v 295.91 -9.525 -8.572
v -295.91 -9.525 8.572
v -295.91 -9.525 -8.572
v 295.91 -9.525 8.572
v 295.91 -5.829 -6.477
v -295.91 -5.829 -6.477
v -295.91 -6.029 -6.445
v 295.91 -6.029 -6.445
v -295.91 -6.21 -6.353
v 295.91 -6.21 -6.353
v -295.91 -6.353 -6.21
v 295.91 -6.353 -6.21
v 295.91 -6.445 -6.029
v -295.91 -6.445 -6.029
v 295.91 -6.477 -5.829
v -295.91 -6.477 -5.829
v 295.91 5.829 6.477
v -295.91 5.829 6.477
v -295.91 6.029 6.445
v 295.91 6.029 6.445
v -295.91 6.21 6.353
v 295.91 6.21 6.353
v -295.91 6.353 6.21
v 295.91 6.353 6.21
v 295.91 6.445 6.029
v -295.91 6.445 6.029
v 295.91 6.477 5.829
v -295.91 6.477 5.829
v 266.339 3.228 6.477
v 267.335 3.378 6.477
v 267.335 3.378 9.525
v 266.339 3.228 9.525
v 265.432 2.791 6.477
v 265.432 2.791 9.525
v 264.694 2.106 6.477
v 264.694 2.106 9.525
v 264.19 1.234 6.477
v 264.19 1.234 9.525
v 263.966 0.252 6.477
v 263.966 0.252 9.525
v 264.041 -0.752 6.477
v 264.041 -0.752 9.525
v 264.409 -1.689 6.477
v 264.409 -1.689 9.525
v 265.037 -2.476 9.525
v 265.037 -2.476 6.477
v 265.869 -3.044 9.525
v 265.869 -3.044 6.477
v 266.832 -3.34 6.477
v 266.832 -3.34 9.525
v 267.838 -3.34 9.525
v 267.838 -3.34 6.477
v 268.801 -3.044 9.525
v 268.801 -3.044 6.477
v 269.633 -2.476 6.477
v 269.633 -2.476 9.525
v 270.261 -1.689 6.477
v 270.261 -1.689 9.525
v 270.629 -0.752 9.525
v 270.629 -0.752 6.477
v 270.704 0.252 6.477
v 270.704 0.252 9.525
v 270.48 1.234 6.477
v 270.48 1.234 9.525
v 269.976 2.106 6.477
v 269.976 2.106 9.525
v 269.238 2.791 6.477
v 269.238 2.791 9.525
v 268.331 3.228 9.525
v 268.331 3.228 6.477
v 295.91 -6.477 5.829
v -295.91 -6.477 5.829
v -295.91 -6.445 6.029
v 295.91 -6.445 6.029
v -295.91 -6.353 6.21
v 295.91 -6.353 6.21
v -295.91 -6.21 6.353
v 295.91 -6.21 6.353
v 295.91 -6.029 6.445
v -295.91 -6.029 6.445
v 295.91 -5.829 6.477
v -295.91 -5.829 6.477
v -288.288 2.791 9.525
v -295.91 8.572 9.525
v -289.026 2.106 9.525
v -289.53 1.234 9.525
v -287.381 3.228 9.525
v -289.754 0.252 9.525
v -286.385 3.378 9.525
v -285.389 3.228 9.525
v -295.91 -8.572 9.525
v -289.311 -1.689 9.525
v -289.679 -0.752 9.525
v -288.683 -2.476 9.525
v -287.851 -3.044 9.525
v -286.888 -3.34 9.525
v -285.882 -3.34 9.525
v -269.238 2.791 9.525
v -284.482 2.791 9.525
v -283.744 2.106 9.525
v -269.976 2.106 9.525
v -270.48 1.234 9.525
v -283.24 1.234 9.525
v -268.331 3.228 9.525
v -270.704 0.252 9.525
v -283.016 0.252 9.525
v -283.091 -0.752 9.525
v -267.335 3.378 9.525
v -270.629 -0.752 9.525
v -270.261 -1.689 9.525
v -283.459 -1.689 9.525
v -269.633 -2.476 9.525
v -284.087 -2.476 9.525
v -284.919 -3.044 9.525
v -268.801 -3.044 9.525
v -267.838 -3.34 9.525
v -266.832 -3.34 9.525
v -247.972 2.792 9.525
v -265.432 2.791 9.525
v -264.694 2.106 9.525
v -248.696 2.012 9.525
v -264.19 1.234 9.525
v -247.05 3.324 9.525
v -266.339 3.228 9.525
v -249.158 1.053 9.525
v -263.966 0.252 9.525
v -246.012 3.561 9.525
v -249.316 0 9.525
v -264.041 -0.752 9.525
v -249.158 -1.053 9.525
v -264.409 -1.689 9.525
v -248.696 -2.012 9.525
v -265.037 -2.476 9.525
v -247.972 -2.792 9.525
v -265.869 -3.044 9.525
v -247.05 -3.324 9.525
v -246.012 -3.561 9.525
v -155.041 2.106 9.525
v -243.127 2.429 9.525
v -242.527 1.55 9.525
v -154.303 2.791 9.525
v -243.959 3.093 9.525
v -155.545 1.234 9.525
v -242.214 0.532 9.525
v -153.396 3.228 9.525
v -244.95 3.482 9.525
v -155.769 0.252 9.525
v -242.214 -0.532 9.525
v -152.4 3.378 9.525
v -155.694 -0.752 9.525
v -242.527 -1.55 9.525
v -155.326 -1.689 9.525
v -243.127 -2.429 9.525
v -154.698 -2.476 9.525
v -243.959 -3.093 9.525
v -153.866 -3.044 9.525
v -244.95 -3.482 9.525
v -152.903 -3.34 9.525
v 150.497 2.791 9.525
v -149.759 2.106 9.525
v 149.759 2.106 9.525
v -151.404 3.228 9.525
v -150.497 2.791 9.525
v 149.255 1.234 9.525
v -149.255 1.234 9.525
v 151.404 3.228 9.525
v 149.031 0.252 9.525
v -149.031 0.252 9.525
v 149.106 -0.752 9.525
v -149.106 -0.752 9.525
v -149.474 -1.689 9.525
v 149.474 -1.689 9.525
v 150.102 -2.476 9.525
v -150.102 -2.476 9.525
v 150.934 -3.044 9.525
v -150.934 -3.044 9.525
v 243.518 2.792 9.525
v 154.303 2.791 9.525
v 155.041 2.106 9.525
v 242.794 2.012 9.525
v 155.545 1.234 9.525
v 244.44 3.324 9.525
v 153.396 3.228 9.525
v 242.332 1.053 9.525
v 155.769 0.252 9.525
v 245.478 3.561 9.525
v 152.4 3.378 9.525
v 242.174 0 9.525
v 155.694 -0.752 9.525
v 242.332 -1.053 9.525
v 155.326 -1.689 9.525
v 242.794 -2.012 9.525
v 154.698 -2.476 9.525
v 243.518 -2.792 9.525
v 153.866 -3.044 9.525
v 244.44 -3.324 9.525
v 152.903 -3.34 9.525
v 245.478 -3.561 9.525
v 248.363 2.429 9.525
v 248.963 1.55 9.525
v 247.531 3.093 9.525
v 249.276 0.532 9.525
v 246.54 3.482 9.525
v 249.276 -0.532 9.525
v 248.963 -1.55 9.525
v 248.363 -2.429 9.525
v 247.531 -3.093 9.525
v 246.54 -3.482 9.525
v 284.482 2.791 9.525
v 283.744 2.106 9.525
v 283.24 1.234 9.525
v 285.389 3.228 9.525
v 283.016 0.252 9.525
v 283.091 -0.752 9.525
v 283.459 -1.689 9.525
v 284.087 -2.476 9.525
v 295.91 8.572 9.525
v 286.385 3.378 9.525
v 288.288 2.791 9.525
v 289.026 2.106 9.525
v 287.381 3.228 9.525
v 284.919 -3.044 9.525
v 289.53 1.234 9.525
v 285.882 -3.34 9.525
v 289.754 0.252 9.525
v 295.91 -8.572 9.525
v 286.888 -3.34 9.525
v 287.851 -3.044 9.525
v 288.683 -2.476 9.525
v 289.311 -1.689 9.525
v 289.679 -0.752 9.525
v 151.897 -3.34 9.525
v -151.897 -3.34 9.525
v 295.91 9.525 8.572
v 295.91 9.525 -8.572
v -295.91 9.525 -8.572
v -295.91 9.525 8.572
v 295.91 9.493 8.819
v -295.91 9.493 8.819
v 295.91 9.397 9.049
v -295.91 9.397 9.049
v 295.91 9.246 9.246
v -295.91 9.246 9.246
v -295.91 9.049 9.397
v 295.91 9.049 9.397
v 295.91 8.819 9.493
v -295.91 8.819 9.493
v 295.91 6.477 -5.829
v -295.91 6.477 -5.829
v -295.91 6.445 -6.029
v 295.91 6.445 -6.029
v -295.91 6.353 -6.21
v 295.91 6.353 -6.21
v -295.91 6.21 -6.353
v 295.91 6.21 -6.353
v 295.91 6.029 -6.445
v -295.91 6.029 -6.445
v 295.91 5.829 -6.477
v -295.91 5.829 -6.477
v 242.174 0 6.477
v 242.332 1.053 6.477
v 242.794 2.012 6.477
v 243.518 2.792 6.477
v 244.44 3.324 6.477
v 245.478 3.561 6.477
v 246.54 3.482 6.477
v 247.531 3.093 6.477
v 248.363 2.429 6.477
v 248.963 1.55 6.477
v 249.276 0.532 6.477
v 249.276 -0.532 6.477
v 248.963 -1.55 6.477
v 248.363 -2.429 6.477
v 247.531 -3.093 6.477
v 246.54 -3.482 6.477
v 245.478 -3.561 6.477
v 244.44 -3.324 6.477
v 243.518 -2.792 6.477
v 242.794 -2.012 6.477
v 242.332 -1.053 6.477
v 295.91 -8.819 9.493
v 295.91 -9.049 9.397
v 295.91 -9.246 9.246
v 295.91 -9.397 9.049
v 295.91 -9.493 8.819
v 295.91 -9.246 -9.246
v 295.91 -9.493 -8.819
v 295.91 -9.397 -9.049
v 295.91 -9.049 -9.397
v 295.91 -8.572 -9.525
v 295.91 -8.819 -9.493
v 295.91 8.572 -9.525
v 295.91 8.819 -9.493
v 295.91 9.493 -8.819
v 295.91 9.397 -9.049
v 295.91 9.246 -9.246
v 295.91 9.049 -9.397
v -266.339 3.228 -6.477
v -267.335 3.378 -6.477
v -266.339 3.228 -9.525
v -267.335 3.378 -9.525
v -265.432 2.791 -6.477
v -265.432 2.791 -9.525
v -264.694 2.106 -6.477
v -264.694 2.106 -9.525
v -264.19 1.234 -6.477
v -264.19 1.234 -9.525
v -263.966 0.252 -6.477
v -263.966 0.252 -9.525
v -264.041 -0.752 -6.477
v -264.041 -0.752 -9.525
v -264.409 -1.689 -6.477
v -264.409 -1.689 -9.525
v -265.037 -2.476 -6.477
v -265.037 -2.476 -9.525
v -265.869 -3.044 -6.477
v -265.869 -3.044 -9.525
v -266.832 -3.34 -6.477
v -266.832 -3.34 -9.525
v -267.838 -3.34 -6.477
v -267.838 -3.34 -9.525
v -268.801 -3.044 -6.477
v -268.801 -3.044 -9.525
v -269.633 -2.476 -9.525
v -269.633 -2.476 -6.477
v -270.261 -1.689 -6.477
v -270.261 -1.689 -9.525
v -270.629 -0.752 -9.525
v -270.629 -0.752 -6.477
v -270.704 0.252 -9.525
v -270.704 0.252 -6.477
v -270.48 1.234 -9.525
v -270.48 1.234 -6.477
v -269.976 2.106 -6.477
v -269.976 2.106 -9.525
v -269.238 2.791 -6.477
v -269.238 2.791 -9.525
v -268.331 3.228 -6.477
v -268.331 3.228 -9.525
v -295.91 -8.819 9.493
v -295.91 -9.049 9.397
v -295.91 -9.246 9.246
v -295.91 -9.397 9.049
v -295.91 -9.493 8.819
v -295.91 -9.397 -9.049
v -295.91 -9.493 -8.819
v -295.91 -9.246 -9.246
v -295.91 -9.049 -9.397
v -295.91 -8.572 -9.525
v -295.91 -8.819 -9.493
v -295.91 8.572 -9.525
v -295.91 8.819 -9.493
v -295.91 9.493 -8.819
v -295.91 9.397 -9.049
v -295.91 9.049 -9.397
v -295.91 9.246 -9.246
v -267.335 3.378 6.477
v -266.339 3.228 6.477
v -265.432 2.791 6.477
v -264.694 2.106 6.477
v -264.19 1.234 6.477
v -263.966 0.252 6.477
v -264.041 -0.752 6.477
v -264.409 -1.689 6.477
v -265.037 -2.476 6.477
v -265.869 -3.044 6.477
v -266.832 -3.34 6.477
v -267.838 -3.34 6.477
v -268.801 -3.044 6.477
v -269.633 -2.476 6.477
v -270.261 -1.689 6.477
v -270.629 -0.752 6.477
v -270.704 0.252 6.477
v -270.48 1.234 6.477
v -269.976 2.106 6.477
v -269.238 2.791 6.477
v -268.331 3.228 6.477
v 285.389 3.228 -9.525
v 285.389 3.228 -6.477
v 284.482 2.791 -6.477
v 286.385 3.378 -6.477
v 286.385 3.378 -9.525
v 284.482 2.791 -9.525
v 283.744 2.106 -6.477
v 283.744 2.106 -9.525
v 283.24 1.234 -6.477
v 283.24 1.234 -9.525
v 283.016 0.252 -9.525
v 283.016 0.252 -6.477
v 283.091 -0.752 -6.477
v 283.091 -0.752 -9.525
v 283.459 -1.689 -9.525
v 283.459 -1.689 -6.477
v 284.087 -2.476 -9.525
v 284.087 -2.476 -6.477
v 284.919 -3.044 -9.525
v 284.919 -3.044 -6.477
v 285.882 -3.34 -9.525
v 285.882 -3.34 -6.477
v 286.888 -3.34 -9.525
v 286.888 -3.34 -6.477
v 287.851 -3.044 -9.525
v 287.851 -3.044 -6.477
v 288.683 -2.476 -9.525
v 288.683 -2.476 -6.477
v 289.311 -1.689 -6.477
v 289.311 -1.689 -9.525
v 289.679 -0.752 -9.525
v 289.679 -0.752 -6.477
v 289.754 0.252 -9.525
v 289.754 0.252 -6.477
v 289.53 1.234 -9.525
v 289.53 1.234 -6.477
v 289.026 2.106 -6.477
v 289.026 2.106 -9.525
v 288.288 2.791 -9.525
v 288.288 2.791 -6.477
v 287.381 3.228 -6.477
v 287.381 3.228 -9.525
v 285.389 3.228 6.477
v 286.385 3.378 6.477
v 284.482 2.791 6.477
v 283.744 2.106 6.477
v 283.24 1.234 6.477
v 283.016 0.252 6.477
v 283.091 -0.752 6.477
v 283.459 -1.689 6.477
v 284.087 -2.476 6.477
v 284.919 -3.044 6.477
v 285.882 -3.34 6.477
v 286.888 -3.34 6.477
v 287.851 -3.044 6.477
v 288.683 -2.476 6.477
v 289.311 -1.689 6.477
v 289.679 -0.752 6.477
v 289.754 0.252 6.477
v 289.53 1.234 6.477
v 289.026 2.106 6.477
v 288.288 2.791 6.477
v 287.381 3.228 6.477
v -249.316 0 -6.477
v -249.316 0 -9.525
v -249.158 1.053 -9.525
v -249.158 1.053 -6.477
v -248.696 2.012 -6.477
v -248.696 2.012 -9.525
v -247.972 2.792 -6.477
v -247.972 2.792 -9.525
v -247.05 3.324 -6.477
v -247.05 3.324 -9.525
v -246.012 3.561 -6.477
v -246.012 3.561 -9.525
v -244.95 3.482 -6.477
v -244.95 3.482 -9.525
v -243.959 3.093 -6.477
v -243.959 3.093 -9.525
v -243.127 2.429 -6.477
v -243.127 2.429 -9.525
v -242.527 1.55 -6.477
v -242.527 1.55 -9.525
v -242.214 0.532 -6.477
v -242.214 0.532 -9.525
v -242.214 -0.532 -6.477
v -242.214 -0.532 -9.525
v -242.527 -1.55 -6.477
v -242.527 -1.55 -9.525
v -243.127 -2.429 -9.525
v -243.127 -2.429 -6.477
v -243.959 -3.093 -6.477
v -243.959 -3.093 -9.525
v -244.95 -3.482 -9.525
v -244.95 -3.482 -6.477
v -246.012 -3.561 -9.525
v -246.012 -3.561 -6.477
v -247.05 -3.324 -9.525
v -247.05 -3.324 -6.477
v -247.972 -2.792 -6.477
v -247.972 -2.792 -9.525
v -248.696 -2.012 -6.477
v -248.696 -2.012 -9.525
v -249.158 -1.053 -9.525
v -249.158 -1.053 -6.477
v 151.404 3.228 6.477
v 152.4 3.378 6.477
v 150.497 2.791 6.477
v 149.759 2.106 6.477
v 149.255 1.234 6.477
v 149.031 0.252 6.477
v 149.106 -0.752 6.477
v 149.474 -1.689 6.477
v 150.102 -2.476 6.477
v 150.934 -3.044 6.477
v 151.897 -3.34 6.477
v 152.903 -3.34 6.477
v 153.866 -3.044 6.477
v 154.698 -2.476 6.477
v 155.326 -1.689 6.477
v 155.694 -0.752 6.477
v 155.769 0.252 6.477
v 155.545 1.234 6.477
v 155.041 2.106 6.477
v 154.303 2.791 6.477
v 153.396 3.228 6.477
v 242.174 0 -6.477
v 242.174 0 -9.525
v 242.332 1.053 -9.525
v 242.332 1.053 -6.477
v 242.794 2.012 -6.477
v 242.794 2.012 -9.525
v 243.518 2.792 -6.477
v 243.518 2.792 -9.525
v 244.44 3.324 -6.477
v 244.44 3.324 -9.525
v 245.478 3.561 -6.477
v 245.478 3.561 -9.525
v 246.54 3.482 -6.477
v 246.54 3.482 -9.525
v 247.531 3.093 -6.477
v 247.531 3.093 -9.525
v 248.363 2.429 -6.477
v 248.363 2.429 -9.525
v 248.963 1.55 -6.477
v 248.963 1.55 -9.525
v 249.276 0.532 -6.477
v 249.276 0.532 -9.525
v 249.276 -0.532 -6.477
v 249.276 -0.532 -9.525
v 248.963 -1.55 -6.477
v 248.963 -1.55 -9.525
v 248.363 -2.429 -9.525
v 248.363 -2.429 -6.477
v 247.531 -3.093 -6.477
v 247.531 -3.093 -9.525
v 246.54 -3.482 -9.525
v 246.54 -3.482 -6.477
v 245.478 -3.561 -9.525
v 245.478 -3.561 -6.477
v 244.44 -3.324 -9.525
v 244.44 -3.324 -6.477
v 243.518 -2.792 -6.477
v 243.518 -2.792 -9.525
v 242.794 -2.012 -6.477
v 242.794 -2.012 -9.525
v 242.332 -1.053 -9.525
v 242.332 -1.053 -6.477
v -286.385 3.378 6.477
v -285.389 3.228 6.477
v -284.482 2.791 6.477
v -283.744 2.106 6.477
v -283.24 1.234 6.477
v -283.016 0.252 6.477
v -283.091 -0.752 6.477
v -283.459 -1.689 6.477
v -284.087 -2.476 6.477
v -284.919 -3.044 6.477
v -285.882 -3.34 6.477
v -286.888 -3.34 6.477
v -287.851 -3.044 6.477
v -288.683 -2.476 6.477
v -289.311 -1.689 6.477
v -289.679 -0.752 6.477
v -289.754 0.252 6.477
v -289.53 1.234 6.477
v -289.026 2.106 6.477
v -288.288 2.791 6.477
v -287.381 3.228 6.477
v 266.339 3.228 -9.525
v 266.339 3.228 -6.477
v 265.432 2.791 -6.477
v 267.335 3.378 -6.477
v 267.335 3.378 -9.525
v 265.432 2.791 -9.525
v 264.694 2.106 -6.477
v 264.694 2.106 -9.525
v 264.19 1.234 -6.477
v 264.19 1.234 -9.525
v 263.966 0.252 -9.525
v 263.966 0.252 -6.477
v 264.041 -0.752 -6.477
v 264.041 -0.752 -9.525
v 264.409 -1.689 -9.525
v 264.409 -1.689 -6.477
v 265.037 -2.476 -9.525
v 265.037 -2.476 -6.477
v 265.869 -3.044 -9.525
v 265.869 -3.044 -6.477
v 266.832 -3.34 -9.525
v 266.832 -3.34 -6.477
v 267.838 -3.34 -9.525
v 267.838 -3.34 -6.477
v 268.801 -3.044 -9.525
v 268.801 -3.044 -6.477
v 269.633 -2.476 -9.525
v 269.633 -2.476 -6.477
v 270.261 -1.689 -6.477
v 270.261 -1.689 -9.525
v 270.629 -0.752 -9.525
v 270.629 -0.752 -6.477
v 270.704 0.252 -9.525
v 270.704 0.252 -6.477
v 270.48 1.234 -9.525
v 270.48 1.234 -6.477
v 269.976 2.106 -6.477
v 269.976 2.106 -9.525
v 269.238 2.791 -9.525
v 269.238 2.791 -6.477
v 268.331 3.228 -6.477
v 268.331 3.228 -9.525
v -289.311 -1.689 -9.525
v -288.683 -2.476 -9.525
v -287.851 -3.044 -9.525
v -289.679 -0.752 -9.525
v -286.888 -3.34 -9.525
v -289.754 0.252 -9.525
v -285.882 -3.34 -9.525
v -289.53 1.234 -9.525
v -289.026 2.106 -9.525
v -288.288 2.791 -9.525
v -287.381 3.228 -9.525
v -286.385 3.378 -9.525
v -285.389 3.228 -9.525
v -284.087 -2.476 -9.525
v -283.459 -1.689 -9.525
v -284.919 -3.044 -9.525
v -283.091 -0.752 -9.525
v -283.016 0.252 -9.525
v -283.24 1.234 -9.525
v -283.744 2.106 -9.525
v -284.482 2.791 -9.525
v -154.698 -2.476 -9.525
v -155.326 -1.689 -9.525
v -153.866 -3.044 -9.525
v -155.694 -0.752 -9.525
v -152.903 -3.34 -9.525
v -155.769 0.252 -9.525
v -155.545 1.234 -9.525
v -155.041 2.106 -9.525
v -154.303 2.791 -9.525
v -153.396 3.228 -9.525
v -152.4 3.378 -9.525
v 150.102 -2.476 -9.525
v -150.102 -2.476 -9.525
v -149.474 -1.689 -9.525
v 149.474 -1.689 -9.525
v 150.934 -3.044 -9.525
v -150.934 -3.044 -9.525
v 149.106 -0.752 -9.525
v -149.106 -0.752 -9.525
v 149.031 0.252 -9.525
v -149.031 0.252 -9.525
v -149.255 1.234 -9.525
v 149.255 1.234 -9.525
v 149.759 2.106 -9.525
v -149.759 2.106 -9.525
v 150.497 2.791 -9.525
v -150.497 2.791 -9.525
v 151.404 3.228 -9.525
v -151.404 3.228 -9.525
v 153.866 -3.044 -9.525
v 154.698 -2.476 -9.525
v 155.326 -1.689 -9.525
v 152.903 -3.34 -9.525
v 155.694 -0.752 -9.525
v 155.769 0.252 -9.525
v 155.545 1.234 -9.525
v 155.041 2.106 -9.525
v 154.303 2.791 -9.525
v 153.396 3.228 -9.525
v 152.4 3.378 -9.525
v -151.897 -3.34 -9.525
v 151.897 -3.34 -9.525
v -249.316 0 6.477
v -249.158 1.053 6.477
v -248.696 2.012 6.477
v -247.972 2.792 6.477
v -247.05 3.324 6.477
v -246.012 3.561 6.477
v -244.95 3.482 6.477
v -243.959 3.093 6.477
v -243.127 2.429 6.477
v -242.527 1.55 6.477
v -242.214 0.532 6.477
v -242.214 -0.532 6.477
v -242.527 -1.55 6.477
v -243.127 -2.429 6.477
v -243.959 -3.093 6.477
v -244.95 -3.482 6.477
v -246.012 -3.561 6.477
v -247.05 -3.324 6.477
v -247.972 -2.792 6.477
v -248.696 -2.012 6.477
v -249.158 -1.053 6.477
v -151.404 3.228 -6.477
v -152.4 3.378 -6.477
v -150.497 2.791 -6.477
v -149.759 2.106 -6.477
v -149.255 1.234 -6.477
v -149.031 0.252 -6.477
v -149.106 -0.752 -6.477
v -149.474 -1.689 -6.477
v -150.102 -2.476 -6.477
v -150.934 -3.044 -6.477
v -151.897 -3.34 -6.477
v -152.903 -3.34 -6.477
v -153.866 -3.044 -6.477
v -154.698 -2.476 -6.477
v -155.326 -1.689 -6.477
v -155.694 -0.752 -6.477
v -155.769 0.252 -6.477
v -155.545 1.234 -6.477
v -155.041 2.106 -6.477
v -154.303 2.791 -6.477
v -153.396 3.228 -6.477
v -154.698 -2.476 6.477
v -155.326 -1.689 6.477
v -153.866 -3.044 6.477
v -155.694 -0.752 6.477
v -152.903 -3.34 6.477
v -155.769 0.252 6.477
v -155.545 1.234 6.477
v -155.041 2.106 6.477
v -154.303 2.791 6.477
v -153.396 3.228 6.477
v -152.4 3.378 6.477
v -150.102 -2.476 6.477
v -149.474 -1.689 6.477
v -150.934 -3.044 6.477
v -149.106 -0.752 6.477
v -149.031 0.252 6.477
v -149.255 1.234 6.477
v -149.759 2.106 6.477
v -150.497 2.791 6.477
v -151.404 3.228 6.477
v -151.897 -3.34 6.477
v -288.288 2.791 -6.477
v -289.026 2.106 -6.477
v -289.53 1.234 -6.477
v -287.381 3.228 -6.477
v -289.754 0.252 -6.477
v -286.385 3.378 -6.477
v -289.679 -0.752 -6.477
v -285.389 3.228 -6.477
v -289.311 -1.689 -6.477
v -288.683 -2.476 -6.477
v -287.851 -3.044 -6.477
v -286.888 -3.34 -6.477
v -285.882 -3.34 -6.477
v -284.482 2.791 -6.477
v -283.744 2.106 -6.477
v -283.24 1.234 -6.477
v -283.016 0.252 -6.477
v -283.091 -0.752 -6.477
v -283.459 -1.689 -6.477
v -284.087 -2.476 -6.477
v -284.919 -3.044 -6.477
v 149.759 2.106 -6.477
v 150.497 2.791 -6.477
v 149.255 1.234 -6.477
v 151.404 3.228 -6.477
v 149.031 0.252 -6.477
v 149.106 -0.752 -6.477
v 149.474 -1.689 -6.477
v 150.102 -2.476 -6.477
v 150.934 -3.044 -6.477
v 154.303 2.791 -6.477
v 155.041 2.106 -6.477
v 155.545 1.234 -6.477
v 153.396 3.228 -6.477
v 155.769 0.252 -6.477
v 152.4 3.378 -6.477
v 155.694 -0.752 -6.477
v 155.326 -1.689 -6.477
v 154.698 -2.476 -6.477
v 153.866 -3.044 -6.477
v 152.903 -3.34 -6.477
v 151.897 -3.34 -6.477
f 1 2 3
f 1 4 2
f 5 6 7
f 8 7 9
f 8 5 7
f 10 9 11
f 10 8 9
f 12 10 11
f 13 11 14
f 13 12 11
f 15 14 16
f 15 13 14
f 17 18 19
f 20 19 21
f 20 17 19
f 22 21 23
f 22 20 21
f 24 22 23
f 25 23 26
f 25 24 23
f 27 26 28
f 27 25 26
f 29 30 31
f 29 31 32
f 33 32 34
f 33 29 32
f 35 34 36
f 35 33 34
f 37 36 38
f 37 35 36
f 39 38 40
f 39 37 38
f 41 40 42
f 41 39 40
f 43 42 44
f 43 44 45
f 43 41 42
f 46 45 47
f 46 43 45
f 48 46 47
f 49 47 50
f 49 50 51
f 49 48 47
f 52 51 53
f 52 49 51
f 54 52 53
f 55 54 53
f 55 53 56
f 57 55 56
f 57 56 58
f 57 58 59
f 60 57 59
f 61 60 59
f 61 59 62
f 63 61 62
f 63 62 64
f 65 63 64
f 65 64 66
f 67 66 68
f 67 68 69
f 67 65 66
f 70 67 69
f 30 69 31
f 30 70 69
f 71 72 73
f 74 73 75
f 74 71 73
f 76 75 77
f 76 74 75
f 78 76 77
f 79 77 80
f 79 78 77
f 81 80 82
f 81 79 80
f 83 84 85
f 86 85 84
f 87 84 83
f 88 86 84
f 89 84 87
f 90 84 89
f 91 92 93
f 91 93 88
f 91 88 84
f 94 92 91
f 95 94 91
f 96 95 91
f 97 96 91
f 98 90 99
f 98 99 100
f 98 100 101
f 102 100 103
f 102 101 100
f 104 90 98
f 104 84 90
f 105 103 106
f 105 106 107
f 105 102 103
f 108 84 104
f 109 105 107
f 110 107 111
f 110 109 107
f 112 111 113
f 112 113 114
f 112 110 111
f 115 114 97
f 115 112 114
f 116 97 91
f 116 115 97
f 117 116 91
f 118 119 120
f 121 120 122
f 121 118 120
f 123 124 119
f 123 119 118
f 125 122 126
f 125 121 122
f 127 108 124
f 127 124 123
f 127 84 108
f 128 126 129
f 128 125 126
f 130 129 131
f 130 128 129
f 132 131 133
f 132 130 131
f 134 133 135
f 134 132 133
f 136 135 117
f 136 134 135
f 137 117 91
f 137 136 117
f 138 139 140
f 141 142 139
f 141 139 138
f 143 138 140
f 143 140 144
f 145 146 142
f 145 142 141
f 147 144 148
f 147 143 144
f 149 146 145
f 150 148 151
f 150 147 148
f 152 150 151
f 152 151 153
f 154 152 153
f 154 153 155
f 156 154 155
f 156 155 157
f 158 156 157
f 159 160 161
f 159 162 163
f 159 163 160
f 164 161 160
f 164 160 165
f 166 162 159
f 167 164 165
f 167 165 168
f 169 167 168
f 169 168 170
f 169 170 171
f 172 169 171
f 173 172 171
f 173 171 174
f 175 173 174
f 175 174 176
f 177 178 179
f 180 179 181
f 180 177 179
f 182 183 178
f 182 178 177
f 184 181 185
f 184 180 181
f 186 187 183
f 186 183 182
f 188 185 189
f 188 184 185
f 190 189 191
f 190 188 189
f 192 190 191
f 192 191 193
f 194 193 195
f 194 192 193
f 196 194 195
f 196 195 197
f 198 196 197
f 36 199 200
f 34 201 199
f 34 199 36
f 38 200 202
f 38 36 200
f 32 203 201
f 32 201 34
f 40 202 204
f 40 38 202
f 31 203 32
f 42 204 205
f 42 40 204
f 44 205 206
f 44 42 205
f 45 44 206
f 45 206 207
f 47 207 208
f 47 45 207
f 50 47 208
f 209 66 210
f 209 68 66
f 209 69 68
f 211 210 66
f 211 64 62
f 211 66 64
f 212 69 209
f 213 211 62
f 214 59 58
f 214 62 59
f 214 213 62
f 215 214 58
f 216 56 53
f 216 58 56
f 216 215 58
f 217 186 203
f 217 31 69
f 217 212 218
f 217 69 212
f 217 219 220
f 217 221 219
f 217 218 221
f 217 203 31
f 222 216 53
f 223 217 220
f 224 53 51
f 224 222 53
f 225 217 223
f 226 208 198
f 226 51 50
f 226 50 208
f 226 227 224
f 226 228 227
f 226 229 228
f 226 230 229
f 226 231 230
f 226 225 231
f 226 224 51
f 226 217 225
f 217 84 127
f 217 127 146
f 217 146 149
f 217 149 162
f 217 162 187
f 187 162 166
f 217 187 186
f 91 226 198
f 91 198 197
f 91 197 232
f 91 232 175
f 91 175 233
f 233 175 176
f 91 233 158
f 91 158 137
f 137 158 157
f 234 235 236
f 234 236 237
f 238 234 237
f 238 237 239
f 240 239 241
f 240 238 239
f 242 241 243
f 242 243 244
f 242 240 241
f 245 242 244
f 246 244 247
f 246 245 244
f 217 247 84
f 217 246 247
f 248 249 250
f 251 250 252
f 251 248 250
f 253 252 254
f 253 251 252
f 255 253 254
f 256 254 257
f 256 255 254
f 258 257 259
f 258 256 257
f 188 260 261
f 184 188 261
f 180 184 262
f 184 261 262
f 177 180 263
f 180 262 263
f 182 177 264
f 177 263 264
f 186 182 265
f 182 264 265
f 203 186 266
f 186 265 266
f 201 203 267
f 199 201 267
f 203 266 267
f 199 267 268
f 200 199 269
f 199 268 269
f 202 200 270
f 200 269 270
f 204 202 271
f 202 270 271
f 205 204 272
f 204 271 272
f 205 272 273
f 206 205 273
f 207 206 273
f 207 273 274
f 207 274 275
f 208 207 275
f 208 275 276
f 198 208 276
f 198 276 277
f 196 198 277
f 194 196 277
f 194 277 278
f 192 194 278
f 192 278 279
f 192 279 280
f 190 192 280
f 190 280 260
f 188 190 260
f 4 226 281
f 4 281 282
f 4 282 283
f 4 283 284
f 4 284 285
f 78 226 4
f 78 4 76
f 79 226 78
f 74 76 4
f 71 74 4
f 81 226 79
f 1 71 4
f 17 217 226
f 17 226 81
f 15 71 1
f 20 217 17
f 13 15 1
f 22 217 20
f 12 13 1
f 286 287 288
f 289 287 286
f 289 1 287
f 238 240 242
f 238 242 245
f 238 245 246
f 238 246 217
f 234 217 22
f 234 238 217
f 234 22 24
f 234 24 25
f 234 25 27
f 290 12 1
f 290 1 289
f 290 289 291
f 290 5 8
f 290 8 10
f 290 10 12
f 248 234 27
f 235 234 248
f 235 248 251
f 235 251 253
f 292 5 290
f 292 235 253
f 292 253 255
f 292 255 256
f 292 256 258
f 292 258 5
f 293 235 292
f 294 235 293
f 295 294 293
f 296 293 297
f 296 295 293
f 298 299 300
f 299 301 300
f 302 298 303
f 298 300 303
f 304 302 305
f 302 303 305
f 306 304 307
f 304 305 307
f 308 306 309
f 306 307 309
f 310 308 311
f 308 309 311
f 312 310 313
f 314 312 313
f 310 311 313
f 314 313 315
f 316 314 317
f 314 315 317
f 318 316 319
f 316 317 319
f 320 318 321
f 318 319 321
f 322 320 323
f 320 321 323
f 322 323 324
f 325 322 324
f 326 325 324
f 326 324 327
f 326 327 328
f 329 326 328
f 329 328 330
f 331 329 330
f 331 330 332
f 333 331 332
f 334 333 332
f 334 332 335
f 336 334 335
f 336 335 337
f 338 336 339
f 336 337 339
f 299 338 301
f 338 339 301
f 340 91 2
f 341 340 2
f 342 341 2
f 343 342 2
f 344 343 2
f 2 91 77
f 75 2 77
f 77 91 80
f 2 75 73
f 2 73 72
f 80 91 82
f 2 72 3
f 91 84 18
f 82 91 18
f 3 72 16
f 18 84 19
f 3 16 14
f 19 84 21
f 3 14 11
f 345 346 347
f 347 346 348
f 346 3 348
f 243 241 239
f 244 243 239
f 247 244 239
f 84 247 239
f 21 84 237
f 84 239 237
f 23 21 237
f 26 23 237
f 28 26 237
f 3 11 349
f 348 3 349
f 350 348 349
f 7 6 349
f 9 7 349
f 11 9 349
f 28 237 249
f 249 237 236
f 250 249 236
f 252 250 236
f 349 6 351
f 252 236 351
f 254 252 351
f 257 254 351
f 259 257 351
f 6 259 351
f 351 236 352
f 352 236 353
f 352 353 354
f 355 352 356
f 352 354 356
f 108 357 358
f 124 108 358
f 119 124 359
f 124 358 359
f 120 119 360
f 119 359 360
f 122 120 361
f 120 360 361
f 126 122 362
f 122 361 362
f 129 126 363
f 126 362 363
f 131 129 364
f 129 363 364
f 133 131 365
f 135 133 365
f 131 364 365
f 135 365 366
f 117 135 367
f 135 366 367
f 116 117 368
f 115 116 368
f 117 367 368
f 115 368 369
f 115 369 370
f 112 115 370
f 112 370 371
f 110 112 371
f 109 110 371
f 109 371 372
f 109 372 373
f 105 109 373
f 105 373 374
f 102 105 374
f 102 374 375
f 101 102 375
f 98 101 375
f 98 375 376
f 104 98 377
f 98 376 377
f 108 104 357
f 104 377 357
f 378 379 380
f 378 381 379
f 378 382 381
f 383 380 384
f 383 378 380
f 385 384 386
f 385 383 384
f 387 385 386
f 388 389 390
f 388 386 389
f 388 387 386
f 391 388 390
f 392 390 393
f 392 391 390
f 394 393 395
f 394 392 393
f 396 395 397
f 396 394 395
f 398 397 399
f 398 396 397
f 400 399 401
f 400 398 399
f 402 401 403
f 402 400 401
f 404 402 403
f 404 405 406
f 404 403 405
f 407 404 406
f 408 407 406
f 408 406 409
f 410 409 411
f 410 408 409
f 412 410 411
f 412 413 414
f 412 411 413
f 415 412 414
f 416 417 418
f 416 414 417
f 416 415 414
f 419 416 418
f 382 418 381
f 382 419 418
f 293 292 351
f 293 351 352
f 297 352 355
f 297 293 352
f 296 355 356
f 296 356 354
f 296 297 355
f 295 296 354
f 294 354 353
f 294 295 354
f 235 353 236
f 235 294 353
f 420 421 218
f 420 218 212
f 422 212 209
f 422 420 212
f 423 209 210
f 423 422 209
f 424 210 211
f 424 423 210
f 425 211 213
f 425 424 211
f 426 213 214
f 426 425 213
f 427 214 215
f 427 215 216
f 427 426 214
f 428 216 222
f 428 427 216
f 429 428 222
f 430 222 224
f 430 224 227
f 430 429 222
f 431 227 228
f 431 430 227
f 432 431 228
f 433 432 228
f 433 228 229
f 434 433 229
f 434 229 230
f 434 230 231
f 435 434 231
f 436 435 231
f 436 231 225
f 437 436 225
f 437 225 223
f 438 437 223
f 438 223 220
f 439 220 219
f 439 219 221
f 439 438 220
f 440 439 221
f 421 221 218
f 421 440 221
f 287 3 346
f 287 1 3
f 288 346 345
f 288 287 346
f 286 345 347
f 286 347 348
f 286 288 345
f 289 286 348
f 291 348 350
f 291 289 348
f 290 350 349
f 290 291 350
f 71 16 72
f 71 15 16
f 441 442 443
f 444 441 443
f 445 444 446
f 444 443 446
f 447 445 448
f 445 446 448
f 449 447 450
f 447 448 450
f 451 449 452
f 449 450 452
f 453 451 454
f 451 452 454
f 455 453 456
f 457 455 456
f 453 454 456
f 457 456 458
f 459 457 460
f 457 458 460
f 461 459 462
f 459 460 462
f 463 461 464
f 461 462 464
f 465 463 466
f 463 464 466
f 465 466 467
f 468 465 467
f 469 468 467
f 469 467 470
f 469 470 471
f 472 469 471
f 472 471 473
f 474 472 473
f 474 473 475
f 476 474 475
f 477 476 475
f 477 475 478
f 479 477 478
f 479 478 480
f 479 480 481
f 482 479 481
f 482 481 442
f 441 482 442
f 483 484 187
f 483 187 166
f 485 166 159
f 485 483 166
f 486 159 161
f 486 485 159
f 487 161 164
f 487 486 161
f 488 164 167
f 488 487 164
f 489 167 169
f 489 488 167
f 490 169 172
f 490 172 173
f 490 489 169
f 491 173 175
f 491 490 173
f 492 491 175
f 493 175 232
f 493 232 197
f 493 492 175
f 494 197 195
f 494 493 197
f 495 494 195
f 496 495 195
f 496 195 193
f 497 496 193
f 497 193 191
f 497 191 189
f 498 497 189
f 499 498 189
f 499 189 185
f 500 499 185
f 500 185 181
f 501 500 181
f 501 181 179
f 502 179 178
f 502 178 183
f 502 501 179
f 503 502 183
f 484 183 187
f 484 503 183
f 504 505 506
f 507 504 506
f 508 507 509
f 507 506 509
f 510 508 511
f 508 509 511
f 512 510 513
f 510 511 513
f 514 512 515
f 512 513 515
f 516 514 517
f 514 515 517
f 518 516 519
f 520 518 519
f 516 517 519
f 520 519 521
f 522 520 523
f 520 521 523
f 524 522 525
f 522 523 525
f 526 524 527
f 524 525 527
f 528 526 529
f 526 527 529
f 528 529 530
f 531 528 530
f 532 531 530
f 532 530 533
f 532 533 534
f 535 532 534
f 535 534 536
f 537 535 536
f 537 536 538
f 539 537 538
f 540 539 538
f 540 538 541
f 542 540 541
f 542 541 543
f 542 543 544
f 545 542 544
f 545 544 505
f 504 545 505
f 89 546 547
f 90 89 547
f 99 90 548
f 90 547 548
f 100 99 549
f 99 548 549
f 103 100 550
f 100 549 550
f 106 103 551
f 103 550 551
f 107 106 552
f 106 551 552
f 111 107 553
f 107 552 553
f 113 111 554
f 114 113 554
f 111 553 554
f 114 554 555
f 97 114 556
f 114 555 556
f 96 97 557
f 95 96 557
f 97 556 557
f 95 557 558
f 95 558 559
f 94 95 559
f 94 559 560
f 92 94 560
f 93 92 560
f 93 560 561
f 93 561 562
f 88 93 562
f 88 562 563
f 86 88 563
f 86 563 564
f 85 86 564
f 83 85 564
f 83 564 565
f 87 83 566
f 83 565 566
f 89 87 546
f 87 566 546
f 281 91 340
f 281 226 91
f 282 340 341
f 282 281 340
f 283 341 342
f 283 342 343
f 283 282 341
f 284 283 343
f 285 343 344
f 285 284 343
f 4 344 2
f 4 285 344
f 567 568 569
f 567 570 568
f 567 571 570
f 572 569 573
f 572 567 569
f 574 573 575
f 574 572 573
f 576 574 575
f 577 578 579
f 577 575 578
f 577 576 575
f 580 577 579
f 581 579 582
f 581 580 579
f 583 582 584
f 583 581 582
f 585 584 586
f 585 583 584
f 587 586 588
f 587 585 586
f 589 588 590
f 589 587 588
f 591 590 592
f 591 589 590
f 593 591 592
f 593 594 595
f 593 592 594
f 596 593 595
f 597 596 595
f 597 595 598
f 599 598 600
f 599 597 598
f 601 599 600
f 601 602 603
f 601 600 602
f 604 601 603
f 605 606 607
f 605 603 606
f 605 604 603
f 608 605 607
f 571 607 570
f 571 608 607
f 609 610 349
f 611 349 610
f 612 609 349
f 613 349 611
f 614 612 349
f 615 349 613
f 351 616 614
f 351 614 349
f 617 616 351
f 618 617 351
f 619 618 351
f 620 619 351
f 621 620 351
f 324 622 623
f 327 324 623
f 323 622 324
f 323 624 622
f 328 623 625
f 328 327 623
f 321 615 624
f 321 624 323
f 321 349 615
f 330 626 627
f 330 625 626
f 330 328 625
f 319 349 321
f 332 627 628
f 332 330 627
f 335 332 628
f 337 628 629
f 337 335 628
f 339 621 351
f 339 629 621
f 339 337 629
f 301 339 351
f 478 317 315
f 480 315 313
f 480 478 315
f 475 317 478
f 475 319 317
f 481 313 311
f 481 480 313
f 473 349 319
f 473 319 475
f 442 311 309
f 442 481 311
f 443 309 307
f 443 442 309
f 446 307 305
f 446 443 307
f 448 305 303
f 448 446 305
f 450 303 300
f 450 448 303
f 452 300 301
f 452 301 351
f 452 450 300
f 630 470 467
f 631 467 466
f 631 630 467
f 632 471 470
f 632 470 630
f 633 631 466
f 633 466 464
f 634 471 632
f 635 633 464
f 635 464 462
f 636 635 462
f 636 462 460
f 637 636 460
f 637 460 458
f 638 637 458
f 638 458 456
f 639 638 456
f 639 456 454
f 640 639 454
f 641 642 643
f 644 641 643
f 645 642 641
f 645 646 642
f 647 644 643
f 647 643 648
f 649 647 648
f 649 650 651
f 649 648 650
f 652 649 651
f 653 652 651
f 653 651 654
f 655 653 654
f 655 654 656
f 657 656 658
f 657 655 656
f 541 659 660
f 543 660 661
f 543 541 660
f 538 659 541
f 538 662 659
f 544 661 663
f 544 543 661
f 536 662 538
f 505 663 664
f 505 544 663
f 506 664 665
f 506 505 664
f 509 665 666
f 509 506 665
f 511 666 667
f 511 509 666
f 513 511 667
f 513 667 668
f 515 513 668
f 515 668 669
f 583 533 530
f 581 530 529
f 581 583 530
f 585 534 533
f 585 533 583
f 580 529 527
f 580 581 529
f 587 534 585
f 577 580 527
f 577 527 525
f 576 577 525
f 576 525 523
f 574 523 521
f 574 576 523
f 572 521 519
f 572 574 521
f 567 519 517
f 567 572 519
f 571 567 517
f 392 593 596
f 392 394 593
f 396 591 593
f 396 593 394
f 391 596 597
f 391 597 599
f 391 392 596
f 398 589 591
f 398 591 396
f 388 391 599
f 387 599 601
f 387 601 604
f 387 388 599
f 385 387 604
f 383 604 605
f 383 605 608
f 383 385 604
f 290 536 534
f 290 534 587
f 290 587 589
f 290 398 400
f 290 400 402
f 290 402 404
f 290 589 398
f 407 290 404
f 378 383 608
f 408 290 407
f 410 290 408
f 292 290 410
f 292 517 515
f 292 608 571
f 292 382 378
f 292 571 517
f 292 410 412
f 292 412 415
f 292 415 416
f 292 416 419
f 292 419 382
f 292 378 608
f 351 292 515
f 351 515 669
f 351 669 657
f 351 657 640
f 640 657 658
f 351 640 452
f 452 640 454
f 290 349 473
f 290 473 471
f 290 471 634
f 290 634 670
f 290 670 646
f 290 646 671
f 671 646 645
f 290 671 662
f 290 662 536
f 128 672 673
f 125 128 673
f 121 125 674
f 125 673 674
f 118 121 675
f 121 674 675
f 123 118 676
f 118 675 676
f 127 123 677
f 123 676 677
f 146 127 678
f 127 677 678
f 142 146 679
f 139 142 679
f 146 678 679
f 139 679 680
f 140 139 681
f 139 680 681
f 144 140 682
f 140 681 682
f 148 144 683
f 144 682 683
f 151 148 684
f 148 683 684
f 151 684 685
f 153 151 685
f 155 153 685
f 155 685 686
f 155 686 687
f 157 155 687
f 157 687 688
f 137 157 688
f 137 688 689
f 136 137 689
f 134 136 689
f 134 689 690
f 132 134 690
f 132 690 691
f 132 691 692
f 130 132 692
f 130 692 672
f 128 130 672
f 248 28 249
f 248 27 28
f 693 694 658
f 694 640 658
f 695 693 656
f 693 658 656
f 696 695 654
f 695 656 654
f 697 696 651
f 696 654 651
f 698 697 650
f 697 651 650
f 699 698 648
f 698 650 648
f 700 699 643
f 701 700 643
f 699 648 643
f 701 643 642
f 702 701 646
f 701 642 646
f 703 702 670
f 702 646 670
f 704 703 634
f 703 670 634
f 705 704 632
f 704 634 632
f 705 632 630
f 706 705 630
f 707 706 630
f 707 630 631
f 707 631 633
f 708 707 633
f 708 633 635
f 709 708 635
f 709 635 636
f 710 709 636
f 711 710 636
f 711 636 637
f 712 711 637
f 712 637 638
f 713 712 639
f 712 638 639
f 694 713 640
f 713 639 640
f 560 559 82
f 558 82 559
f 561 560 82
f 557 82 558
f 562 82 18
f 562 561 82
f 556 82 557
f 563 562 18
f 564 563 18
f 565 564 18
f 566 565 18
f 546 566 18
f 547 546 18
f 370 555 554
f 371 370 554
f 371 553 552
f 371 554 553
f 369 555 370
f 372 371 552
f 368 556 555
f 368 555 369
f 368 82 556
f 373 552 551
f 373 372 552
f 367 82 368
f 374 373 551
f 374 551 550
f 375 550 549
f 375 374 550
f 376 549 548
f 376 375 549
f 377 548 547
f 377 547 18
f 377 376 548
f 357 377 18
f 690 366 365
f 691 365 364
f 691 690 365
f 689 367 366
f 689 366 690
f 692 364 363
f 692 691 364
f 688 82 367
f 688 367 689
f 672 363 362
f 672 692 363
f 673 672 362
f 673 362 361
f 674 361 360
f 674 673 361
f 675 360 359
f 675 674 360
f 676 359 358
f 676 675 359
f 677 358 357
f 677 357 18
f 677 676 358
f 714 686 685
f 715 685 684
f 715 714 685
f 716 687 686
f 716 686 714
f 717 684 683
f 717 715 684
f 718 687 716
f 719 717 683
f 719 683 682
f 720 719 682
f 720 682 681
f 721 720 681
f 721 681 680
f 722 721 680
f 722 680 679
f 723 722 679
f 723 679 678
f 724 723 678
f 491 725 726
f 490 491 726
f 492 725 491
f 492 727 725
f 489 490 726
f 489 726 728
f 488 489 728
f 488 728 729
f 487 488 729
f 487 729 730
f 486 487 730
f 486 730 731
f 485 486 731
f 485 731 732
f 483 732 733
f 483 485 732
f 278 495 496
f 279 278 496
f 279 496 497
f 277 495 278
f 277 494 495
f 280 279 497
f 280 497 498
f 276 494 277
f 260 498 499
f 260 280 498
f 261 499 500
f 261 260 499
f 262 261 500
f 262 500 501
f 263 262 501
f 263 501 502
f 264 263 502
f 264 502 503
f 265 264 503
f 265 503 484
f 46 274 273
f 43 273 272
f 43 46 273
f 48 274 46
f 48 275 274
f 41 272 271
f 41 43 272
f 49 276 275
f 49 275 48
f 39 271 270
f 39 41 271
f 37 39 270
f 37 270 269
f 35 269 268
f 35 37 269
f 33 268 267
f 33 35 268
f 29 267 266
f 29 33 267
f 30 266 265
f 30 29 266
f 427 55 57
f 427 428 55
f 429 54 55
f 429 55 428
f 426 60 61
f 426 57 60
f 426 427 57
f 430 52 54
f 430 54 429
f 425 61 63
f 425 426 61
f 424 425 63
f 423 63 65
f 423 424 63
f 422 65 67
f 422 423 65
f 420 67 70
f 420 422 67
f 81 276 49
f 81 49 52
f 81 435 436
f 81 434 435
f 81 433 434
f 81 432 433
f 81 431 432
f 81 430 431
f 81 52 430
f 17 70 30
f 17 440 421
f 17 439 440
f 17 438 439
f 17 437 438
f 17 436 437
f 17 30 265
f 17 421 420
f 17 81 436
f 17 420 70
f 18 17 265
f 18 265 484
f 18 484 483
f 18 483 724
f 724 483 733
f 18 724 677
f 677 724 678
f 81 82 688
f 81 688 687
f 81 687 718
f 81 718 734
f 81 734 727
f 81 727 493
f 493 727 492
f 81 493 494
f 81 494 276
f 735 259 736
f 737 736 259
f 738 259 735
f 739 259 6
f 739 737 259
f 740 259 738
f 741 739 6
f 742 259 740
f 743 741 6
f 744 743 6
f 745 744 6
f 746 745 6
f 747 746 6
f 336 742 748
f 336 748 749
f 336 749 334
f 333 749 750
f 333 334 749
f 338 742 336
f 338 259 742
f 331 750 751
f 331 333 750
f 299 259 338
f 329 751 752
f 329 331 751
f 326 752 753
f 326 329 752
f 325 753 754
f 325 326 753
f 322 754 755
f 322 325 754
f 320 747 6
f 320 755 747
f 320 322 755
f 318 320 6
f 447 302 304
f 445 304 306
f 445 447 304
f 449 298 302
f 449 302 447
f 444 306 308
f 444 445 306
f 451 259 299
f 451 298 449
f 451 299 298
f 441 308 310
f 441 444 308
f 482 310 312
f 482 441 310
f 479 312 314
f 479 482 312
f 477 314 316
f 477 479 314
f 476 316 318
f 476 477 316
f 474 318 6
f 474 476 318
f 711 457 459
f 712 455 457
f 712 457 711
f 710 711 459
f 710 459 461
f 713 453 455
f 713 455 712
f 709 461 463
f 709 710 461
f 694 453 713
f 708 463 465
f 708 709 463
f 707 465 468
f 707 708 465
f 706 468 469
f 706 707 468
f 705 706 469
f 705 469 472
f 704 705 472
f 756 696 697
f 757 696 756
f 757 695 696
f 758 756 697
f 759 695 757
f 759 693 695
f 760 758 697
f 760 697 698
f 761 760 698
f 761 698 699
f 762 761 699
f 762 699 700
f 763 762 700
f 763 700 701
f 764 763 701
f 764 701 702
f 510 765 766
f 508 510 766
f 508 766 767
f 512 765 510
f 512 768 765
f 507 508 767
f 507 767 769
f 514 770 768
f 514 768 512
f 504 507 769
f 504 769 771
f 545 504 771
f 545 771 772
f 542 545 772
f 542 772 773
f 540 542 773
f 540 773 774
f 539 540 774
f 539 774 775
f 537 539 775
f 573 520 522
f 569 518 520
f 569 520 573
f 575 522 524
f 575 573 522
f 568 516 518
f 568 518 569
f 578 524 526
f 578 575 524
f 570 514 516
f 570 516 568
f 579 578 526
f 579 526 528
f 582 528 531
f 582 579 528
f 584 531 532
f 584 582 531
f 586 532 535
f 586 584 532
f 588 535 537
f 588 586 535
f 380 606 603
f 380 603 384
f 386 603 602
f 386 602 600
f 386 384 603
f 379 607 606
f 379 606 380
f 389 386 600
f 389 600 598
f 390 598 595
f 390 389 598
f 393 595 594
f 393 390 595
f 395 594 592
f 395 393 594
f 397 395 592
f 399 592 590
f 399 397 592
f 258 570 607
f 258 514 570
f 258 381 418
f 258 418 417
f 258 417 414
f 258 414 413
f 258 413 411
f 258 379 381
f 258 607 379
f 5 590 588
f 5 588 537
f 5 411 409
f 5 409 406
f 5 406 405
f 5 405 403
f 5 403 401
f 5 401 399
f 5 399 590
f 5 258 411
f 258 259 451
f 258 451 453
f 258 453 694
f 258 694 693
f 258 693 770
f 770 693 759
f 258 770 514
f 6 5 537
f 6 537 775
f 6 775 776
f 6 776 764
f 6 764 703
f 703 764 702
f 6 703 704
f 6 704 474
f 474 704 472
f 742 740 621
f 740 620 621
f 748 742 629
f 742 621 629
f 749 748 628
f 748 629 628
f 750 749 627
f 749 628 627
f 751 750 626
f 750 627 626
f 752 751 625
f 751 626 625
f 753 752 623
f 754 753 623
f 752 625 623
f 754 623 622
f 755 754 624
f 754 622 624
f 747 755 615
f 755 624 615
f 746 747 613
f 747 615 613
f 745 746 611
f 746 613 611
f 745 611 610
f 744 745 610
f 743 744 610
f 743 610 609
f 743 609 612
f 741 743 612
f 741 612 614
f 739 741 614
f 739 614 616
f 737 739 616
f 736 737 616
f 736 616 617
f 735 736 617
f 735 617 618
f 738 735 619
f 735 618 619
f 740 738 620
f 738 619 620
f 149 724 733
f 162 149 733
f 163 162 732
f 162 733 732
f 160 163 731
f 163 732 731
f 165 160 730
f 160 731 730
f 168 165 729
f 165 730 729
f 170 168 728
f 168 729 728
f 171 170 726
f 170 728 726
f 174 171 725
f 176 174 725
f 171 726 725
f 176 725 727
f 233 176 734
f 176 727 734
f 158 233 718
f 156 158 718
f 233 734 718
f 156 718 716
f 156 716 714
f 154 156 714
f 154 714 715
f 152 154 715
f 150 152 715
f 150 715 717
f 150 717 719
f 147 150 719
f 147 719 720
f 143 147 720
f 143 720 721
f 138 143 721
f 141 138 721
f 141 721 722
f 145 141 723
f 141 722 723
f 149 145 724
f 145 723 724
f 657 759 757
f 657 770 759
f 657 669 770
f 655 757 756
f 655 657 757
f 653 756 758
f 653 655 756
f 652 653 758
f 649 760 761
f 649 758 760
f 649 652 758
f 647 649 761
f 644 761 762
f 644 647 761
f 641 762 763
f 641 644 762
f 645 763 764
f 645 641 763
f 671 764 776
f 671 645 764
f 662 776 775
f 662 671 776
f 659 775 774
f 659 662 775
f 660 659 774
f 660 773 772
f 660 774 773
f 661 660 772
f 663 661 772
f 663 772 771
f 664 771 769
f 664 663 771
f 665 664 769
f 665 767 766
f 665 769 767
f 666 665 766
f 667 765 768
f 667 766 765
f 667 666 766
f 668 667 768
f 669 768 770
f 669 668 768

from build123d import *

# Parameters (mm, degrees)
BOSS_EXTRUDE1_DEPTH              = 295.91
F_1_4_CLEARANCE_HOLE1_AT_2_COUNT = 2
F_1_4_CLEARANCE_HOLE1_AT_2_PITCH = 31.75
F_1_4_CLEARANCE_HOLE1_AT_3_COUNT = 2
F_1_4_CLEARANCE_HOLE1_AT_3_PITCH = 50.8
F_1_4_CLEARANCE_HOLE1_AT_4_COUNT = 2
F_1_4_CLEARANCE_HOLE1_AT_4_PITCH = 165.735
F_1_4_CLEARANCE_HOLE2_D          = 7.14248


with BuildPart() as part:
    # Sketch4 → Boss-Extrude1 (new, symmetric)
    with BuildSketch(Plane(origin=(0, 0, 0), x_dir=(0, 0, -1), z_dir=(1, 0, 0))):
        with BuildLine():
            Line((9.525, -8.5725), (9.525, 8.5725))
            ThreePointArc((9.525, 8.5725), (9.246019209, 9.246019209), (8.5725, 9.525))
            Line((8.5725, 9.525), (-8.5725, 9.525))
            ThreePointArc((-8.5725, 9.525), (-9.246019209, 9.246019209), (-9.525, 8.5725))
            Line((-9.525, 8.5725), (-9.525, -8.5725))
            ThreePointArc((-9.525, -8.5725), (-9.246019209, -9.246019209), (-8.5725, -9.525))
            Line((-8.5725, -9.525), (8.5725, -9.525))
            ThreePointArc((8.5725, -9.525), (9.246019209, -9.246019209), (9.525, -8.5725))
        make_face()
        with BuildLine():
            Line((6.477, 5.8293), (6.477, -5.8293))
            ThreePointArc((6.477, -5.8293), (6.287293062, -6.287293062), (5.8293, -6.477))
            Line((5.8293, -6.477), (-5.8293, -6.477))
            ThreePointArc((-5.8293, -6.477), (-6.287293062, -6.287293062), (-6.477, -5.8293))
            Line((-6.477, -5.8293), (-6.477, 5.8293))
            ThreePointArc((-6.477, 5.8293), (-6.287293062, 6.287293062), (-5.8293, 6.477))
            Line((-5.8293, 6.477), (5.8293, 6.477))
            ThreePointArc((5.8293, 6.477), (6.287293062, 6.287293062), (6.477, 5.8293))
        make_face(mode=Mode.SUBTRACT)
    extrude(amount=BOSS_EXTRUDE1_DEPTH, both=True)

    # Sketch6 → 1/4 Clearance Hole1 (revolve, cut)
    with BuildSketch(Plane(origin=(318.135, 0, -9.525), x_dir=(0, 1, 0), z_dir=(1, 0, 0))):
        Polygon((0, 0), (0, 21.079827343), (3.3782, 19.05), (3.3782, 0), align=None)
    f_1_4_clearance_hole1 = revolve(axis=Axis((318.135, 0, -15.875), (0, 0, 1)), mode=Mode.SUBTRACT)

    # 1/4 Clearance Hole1 at 2: 1/4 Clearance Hole1 ×2
    with Locations(*[(-i * F_1_4_CLEARANCE_HOLE1_AT_2_PITCH, 0, 0) for i in range(1, F_1_4_CLEARANCE_HOLE1_AT_2_COUNT)]):
        add(f_1_4_clearance_hole1, mode=Mode.SUBTRACT)

    # 1/4 Clearance Hole1 at 3: 1/4 Clearance Hole1 ×2
    with Locations(*[(-i * F_1_4_CLEARANCE_HOLE1_AT_3_PITCH, 0, 0) for i in range(1, F_1_4_CLEARANCE_HOLE1_AT_3_COUNT)]):
        add(f_1_4_clearance_hole1, mode=Mode.SUBTRACT)

    # 1/4 Clearance Hole1 at 4: 1/4 Clearance Hole1 ×2
    with Locations(*[(-i * F_1_4_CLEARANCE_HOLE1_AT_4_PITCH, 0, 0) for i in range(1, F_1_4_CLEARANCE_HOLE1_AT_4_COUNT)]):
        add(f_1_4_clearance_hole1, mode=Mode.SUBTRACT)

    # Mirror2: 1/4 Clearance Hole1 across plane
    add(f_1_4_clearance_hole1.mirror(Plane(origin=(0, 0, 0), x_dir=(0, 0, 1), z_dir=(1, 0, 0))), mode=Mode.SUBTRACT)

    # Mirror2 copy 1 sketch → Mirror2 copy 1 (revolve, cut)
    with BuildSketch(Plane(origin=(-286.385, 0, -9.525), x_dir=(0, 1, 0), z_dir=(-1, 0, 0))):
        Polygon((0, 0), (0, -21.079827343), (3.3782, -19.05), (3.3782, 0), align=None)
    revolve(axis=Axis((-286.385, 0, -15.875), (0, 0, -1)), mode=Mode.SUBTRACT)

    # Mirror2 copy 2 sketch → Mirror2 copy 2 (revolve, cut)
    with BuildSketch(Plane(origin=(-267.335, 0, -9.525), x_dir=(0, 1, 0), z_dir=(-1, 0, 0))):
        Polygon((0, 0), (0, -21.079827343), (3.3782, -19.05), (3.3782, 0), align=None)
    revolve(axis=Axis((-267.335, 0, -15.875), (0, 0, -1)), mode=Mode.SUBTRACT)

    # Mirror2 copy 3 sketch → Mirror2 copy 3 (revolve, cut)
    with BuildSketch(Plane(origin=(-152.4, 0, -9.525), x_dir=(0, 1, 0), z_dir=(-1, 0, 0))):
        Polygon((0, 0), (0, -21.079827343), (3.3782, -19.05), (3.3782, 0), align=None)
    revolve(axis=Axis((-152.4, 0, -15.875), (0, 0, -1)), mode=Mode.SUBTRACT)

    # 1/4 Clearance Hole2 (through all)
    with Locations(Plane.XY.offset(9.525)):
        with Locations((245.745, 0), (-245.745, 0)):
            Hole(F_1_4_CLEARANCE_HOLE2_D / 2)


solid = part.part
